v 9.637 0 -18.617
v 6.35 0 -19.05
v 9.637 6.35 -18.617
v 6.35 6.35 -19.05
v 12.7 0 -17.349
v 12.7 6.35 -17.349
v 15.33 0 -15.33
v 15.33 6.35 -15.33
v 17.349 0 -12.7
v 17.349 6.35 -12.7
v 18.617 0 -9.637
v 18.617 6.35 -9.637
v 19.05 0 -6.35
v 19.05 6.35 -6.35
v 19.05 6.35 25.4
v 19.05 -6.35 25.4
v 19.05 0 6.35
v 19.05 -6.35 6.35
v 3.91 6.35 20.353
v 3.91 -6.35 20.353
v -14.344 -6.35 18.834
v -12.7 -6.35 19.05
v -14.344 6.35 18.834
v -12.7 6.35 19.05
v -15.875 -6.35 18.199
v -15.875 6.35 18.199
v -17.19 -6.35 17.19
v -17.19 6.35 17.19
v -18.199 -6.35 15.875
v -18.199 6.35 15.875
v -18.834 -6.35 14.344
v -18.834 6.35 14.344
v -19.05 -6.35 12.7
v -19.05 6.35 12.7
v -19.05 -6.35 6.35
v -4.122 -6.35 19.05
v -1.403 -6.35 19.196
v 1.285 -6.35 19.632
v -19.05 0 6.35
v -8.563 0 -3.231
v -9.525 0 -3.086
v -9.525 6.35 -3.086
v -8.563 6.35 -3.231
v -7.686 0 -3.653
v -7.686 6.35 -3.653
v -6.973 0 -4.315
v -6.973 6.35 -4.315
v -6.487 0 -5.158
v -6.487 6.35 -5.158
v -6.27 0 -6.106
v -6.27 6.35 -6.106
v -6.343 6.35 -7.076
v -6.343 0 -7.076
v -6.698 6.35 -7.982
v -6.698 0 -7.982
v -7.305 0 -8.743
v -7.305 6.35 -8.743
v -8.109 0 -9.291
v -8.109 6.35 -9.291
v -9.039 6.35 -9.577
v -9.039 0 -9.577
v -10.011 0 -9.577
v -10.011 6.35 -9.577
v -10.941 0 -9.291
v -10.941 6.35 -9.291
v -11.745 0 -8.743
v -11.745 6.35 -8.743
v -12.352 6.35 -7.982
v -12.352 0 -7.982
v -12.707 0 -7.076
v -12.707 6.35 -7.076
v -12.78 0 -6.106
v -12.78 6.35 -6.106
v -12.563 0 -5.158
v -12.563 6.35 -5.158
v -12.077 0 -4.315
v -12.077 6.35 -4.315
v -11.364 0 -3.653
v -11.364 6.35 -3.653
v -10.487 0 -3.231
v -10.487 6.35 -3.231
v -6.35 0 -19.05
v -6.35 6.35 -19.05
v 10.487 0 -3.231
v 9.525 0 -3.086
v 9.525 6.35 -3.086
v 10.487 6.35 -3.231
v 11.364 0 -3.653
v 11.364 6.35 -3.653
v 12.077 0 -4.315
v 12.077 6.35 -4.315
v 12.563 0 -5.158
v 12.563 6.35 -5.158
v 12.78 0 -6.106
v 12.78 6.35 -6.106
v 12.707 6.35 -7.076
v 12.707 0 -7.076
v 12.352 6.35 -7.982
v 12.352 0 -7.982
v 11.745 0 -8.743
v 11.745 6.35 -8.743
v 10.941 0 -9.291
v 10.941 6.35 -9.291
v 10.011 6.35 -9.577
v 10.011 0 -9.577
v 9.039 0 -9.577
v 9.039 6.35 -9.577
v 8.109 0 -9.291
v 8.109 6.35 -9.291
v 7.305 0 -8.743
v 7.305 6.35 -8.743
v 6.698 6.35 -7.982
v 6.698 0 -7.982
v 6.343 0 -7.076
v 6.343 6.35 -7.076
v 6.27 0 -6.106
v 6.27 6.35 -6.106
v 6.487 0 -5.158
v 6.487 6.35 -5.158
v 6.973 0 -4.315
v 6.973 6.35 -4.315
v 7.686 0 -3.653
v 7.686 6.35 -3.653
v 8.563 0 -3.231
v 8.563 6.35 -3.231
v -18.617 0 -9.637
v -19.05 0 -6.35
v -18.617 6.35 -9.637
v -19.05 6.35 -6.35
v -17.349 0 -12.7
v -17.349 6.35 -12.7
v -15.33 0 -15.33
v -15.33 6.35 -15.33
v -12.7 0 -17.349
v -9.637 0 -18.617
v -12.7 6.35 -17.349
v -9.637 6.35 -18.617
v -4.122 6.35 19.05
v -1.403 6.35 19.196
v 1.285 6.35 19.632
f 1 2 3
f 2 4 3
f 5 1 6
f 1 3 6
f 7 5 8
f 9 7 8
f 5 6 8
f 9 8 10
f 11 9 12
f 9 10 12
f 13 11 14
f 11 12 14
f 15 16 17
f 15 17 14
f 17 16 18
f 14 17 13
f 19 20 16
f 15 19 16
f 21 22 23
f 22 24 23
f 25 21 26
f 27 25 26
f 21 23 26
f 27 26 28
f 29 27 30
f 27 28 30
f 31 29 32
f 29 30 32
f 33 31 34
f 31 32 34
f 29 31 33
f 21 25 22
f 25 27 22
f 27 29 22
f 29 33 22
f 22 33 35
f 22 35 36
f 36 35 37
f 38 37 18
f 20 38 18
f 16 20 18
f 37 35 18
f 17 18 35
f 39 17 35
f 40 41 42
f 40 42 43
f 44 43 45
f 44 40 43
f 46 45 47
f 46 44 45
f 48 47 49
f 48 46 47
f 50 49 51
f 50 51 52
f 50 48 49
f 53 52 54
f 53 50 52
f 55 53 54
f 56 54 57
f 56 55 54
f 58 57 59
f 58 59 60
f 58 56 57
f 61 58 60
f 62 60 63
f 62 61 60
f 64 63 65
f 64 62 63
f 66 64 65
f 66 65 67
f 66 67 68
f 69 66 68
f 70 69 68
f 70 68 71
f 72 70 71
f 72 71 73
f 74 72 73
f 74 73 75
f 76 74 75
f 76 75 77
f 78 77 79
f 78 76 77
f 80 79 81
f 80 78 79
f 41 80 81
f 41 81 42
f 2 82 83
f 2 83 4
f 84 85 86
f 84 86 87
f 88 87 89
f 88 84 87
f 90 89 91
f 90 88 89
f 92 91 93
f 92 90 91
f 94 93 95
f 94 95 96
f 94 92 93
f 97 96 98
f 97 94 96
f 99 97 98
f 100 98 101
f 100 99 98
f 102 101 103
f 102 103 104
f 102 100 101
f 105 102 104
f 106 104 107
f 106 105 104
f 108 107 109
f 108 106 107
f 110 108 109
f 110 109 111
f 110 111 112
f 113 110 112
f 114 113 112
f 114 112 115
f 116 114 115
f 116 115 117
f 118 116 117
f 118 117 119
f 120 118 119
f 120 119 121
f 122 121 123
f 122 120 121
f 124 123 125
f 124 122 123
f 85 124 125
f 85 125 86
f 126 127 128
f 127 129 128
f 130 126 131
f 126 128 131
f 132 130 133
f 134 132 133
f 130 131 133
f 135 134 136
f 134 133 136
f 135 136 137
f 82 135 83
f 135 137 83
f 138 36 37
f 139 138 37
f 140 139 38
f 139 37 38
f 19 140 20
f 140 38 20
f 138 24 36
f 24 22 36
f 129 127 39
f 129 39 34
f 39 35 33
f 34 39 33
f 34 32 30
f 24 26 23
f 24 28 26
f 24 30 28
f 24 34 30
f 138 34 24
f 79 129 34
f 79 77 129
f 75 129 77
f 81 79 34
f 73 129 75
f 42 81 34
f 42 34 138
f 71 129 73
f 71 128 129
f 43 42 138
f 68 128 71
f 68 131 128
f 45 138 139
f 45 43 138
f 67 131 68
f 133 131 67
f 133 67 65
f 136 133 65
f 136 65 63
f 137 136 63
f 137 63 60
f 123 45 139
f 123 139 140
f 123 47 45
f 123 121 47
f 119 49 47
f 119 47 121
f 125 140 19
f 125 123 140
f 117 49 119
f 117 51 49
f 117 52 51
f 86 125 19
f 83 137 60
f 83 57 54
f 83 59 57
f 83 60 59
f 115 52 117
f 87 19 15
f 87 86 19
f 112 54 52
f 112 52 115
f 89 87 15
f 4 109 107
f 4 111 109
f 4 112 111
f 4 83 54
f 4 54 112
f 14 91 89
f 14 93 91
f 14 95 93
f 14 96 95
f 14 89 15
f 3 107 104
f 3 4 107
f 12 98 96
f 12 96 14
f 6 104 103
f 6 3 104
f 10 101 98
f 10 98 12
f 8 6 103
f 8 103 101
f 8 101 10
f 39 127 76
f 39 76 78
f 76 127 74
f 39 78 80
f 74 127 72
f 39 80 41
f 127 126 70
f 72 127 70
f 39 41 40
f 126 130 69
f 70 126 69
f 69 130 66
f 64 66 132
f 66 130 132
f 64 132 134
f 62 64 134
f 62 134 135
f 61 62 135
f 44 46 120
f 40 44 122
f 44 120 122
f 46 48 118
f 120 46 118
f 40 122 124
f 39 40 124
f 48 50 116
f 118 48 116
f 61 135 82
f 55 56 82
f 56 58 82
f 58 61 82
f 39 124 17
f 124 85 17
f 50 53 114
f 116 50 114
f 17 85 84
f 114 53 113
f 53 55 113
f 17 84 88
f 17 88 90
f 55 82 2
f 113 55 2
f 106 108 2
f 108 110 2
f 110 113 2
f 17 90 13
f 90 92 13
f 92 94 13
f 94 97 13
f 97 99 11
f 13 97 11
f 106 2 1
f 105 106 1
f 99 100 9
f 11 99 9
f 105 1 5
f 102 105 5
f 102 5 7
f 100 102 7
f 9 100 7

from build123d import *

# Parameters (mm, degrees)
SKETCH1_R           = 3.2639
BOSS_EXTRUDE1_DEPTH = 6.35
BOSS_EXTRUDE2_START = -6.35
BOSS_EXTRUDE2_DEPTH = 6.35
FILLET1_R           = 6.35
FILLET2_R           = 12.7


with BuildPart() as part:
    # Sketch1 → Boss-Extrude1 (new body)
    with BuildSketch(Plane(origin=(0, 0, 0), x_dir=(1, 0, 0), z_dir=(0, 1, 0))):
        with BuildLine():
            Line((-19.05, 19.05), (-19.05, -19.05))
            Line((-19.05, -19.05), (-4.121852568, -19.05))
            ThreePointArc((-4.121852568, -19.05), (-0.053223596, -19.377978576), (3.910332689, -20.35344423))
            Line((3.910332689, -20.35344423), (19.05, -25.4))
            Line((19.05, -25.4), (19.05, 19.05))
            Line((19.05, 19.05), (-19.05, 19.05))
        make_face()
        with Locations((-9.525, 6.35)):
            Circle(SKETCH1_R, mode=Mode.SUBTRACT)
        with Locations((9.525, 6.35)):
            Circle(SKETCH1_R, mode=Mode.SUBTRACT)
    extrude(amount=BOSS_EXTRUDE1_DEPTH)

    # Sketch1<7> → Boss-Extrude2 (add)
    with BuildSketch(Plane(origin=(0, 0, 0), x_dir=(1, 0, 0), z_dir=(0, 1, 0)).offset(BOSS_EXTRUDE2_START)):
        with BuildLine():
            Line((19.05, -6.35), (-19.05, -6.35))
            Line((-19.05, -6.35), (-19.05, -19.05))
            Line((-19.05, -19.05), (-4.121852568, -19.05))
            ThreePointArc((-4.121852568, -19.05), (-0.053223596, -19.377978576), (3.910332689, -20.35344423))
            Line((3.910332689, -20.35344423), (19.05, -25.4))
            Line((19.05, -25.4), (19.05, -19.05))
            Line((19.05, -19.05), (19.05, -6.35))
        make_face()
    extrude(amount=BOSS_EXTRUDE2_DEPTH)

    # Fillet1
    fillet1_edges = [part.edges().sort_by_distance(p)[0] for p in [
        (-19.05, 0, 19.05),
    ]]
    fillet(fillet1_edges, radius=FILLET1_R)

    # Fillet2
    fillet2_edges = [part.edges().sort_by_distance(p)[0] for p in [
        (19.05, 3.175, -19.05),
        (-19.05, 3.175, -19.05),
    ]]
    fillet(fillet2_edges, radius=FILLET2_R)


solid = part.part
